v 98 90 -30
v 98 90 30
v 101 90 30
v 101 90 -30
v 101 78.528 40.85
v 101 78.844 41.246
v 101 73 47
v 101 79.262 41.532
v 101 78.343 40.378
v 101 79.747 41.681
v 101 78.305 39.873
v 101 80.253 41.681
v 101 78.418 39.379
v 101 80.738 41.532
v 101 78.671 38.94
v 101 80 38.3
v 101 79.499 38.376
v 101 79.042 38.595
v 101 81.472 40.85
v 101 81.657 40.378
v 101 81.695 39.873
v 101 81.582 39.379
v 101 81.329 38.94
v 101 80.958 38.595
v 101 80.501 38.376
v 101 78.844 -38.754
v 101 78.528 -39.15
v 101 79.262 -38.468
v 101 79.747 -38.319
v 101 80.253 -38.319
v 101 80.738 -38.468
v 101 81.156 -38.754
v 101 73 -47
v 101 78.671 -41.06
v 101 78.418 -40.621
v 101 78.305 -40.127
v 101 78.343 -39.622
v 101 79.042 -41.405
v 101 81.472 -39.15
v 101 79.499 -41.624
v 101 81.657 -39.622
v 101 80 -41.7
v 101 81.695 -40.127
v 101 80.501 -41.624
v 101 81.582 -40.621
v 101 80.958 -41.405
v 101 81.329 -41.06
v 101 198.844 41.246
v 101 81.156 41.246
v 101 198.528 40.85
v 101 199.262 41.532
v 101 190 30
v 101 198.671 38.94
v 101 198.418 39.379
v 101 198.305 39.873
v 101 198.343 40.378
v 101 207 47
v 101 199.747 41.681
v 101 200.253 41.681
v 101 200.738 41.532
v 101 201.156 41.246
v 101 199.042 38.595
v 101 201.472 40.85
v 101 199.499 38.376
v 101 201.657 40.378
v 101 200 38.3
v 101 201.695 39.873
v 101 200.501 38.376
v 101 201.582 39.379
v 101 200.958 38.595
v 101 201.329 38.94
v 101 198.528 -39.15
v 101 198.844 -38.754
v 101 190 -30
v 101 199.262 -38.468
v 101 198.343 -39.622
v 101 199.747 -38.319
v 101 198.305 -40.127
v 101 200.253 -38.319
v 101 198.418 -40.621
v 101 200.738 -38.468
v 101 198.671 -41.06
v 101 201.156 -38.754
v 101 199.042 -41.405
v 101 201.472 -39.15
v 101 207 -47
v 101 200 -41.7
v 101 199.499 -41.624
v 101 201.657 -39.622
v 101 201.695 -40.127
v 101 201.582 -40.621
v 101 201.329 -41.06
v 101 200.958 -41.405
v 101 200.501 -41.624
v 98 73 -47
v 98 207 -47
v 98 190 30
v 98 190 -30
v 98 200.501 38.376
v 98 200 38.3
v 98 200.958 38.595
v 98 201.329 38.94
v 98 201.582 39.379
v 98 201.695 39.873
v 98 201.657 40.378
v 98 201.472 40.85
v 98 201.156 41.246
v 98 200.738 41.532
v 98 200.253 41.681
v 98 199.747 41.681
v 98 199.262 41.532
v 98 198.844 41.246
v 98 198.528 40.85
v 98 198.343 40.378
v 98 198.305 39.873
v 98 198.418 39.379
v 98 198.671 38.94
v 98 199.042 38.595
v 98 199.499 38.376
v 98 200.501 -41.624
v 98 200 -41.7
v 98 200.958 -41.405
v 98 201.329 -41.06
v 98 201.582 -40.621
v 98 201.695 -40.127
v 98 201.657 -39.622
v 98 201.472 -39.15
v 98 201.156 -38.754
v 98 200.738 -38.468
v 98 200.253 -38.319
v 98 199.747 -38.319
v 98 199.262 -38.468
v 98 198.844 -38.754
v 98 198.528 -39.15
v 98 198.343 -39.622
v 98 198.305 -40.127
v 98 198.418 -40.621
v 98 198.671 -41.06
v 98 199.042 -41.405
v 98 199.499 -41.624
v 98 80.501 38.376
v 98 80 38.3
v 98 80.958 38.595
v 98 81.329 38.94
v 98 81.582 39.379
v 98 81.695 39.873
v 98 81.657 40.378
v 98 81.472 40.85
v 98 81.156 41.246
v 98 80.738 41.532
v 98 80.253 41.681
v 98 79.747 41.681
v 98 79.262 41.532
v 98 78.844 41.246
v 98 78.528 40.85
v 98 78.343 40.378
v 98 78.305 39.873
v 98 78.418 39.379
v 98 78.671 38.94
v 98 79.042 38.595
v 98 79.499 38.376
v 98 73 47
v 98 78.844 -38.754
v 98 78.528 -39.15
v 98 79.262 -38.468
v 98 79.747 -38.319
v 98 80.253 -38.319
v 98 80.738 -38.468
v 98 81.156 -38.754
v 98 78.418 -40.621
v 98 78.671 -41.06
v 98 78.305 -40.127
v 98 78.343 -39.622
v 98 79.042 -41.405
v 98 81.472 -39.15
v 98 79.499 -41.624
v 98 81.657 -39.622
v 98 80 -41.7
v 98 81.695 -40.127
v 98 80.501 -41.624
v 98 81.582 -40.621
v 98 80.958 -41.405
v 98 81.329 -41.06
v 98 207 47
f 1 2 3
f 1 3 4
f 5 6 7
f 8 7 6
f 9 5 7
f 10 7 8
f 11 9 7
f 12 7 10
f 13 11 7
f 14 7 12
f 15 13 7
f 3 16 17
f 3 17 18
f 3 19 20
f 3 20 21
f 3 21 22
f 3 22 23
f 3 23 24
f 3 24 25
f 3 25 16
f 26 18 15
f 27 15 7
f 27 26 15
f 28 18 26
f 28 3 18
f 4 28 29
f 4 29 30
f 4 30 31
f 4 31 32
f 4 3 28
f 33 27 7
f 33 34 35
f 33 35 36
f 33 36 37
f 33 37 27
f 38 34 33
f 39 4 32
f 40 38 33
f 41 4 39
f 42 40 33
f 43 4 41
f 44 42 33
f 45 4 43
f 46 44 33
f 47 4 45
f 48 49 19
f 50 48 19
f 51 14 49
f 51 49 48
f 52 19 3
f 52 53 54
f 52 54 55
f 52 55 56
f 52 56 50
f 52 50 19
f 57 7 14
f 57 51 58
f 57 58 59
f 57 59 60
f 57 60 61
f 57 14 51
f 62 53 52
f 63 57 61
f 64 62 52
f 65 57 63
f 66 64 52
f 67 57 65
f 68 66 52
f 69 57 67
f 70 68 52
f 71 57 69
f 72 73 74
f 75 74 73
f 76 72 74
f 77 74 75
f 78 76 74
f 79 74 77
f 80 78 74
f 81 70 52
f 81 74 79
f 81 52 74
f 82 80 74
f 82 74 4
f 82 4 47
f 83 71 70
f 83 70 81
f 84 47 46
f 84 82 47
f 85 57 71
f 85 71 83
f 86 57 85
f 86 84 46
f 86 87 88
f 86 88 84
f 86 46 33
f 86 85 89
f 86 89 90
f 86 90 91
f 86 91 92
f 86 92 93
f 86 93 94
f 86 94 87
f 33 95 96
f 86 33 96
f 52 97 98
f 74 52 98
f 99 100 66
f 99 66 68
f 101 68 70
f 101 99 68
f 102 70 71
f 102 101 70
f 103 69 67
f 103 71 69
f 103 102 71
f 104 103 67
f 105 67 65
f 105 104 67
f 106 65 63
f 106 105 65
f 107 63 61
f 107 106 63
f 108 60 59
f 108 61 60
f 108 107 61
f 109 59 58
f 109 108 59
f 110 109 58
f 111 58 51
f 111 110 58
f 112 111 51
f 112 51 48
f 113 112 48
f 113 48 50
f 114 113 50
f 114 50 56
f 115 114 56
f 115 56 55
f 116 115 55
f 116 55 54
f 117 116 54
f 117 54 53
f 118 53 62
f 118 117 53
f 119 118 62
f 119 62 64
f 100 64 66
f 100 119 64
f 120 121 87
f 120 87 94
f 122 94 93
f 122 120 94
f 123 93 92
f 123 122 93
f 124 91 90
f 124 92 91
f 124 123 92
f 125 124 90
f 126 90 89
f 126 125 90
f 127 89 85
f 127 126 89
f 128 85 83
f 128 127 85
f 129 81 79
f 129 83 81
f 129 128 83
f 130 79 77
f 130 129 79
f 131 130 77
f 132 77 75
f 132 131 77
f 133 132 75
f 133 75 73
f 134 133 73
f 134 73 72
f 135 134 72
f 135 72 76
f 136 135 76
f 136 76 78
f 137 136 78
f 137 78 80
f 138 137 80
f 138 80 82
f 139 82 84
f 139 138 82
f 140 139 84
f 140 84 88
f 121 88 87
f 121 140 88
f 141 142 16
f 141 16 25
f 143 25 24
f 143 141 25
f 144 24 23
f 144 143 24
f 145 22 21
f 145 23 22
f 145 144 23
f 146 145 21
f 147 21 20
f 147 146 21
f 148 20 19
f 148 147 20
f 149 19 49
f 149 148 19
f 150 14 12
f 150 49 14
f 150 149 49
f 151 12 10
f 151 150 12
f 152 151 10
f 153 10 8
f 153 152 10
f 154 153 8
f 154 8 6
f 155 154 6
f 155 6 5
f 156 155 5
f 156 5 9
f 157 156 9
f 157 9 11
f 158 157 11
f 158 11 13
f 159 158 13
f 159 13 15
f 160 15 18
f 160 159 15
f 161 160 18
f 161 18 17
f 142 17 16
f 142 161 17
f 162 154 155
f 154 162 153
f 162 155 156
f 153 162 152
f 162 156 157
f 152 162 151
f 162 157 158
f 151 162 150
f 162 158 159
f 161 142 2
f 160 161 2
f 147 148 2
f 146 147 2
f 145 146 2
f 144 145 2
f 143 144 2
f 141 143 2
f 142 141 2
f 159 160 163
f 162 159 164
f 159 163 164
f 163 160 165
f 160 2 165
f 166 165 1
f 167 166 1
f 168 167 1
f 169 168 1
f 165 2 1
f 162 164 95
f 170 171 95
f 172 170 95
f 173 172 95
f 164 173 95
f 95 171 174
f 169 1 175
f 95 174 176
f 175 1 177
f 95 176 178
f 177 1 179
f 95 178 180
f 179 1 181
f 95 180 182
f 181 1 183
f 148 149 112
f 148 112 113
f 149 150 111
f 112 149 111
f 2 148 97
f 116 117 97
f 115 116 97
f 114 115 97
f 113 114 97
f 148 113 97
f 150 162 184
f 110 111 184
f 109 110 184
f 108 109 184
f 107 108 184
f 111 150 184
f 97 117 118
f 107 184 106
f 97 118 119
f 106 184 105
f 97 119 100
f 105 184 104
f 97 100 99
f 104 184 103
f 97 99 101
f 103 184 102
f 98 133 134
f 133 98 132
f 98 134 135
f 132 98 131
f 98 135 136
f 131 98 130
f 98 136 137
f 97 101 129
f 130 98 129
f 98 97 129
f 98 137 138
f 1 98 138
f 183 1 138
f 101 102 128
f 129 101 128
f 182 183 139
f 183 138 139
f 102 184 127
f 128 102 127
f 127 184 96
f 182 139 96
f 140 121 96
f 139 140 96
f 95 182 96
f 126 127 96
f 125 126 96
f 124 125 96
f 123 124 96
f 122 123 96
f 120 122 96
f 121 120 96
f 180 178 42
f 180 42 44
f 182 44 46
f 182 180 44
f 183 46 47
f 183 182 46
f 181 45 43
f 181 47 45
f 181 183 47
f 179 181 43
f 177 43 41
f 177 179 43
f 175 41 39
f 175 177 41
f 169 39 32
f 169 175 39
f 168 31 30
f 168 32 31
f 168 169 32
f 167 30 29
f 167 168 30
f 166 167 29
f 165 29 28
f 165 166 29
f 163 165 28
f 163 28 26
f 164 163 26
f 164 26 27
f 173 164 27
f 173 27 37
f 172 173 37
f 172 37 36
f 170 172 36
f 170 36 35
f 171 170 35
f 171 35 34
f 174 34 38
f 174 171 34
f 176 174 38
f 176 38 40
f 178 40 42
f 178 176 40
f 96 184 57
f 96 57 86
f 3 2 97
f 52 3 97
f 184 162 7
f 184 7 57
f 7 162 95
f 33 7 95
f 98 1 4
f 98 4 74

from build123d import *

# Parameters (mm, degrees)
FLANGE_START                 = 98
SKETCH1_W                    = 94
SKETCH1_H                    = 134
FLANGE_DEPTH                 = 3
PORT_AND_M3_HOLES_DEPTH      = 236.072329295
PORT_AND_M3_HOLES_DEPTH_BACK = 236.072329295
SKETCH2_R                    = 1.7
SKETCH2_W                    = 60
SKETCH2_H                    = 100


with BuildPart() as part:
    # Sketch1 → flange (new body)
    with BuildSketch(Plane(origin=(0, 0, 0), x_dir=(0, 0, -1), z_dir=(1, 0, 0)).offset(FLANGE_START)):
        with Locations((0, 140)):
            Rectangle(SKETCH1_W, SKETCH1_H)
    extrude(amount=FLANGE_DEPTH)

    # Sketch2 → Port_and_M3_holes (cut, two sides: drawn at the far end of the back side and taken through both)
    with BuildSketch(Plane(origin=(0, 0, 0), x_dir=(0, 0, -1), z_dir=(1, 0, 0)).offset(-PORT_AND_M3_HOLES_DEPTH_BACK)):
        with Locations((40, 80)):
            Circle(SKETCH2_R)
        with Locations((-40, 80)):
            Circle(SKETCH2_R)
        with Locations((40, 200)):
            Circle(SKETCH2_R)
        with Locations((-40, 200)):
            Circle(SKETCH2_R)
        with Locations((0, 140)):
            Rectangle(SKETCH2_W, SKETCH2_H)
    extrude(amount=PORT_AND_M3_HOLES_DEPTH + PORT_AND_M3_HOLES_DEPTH_BACK, mode=Mode.SUBTRACT)


solid = part.part
